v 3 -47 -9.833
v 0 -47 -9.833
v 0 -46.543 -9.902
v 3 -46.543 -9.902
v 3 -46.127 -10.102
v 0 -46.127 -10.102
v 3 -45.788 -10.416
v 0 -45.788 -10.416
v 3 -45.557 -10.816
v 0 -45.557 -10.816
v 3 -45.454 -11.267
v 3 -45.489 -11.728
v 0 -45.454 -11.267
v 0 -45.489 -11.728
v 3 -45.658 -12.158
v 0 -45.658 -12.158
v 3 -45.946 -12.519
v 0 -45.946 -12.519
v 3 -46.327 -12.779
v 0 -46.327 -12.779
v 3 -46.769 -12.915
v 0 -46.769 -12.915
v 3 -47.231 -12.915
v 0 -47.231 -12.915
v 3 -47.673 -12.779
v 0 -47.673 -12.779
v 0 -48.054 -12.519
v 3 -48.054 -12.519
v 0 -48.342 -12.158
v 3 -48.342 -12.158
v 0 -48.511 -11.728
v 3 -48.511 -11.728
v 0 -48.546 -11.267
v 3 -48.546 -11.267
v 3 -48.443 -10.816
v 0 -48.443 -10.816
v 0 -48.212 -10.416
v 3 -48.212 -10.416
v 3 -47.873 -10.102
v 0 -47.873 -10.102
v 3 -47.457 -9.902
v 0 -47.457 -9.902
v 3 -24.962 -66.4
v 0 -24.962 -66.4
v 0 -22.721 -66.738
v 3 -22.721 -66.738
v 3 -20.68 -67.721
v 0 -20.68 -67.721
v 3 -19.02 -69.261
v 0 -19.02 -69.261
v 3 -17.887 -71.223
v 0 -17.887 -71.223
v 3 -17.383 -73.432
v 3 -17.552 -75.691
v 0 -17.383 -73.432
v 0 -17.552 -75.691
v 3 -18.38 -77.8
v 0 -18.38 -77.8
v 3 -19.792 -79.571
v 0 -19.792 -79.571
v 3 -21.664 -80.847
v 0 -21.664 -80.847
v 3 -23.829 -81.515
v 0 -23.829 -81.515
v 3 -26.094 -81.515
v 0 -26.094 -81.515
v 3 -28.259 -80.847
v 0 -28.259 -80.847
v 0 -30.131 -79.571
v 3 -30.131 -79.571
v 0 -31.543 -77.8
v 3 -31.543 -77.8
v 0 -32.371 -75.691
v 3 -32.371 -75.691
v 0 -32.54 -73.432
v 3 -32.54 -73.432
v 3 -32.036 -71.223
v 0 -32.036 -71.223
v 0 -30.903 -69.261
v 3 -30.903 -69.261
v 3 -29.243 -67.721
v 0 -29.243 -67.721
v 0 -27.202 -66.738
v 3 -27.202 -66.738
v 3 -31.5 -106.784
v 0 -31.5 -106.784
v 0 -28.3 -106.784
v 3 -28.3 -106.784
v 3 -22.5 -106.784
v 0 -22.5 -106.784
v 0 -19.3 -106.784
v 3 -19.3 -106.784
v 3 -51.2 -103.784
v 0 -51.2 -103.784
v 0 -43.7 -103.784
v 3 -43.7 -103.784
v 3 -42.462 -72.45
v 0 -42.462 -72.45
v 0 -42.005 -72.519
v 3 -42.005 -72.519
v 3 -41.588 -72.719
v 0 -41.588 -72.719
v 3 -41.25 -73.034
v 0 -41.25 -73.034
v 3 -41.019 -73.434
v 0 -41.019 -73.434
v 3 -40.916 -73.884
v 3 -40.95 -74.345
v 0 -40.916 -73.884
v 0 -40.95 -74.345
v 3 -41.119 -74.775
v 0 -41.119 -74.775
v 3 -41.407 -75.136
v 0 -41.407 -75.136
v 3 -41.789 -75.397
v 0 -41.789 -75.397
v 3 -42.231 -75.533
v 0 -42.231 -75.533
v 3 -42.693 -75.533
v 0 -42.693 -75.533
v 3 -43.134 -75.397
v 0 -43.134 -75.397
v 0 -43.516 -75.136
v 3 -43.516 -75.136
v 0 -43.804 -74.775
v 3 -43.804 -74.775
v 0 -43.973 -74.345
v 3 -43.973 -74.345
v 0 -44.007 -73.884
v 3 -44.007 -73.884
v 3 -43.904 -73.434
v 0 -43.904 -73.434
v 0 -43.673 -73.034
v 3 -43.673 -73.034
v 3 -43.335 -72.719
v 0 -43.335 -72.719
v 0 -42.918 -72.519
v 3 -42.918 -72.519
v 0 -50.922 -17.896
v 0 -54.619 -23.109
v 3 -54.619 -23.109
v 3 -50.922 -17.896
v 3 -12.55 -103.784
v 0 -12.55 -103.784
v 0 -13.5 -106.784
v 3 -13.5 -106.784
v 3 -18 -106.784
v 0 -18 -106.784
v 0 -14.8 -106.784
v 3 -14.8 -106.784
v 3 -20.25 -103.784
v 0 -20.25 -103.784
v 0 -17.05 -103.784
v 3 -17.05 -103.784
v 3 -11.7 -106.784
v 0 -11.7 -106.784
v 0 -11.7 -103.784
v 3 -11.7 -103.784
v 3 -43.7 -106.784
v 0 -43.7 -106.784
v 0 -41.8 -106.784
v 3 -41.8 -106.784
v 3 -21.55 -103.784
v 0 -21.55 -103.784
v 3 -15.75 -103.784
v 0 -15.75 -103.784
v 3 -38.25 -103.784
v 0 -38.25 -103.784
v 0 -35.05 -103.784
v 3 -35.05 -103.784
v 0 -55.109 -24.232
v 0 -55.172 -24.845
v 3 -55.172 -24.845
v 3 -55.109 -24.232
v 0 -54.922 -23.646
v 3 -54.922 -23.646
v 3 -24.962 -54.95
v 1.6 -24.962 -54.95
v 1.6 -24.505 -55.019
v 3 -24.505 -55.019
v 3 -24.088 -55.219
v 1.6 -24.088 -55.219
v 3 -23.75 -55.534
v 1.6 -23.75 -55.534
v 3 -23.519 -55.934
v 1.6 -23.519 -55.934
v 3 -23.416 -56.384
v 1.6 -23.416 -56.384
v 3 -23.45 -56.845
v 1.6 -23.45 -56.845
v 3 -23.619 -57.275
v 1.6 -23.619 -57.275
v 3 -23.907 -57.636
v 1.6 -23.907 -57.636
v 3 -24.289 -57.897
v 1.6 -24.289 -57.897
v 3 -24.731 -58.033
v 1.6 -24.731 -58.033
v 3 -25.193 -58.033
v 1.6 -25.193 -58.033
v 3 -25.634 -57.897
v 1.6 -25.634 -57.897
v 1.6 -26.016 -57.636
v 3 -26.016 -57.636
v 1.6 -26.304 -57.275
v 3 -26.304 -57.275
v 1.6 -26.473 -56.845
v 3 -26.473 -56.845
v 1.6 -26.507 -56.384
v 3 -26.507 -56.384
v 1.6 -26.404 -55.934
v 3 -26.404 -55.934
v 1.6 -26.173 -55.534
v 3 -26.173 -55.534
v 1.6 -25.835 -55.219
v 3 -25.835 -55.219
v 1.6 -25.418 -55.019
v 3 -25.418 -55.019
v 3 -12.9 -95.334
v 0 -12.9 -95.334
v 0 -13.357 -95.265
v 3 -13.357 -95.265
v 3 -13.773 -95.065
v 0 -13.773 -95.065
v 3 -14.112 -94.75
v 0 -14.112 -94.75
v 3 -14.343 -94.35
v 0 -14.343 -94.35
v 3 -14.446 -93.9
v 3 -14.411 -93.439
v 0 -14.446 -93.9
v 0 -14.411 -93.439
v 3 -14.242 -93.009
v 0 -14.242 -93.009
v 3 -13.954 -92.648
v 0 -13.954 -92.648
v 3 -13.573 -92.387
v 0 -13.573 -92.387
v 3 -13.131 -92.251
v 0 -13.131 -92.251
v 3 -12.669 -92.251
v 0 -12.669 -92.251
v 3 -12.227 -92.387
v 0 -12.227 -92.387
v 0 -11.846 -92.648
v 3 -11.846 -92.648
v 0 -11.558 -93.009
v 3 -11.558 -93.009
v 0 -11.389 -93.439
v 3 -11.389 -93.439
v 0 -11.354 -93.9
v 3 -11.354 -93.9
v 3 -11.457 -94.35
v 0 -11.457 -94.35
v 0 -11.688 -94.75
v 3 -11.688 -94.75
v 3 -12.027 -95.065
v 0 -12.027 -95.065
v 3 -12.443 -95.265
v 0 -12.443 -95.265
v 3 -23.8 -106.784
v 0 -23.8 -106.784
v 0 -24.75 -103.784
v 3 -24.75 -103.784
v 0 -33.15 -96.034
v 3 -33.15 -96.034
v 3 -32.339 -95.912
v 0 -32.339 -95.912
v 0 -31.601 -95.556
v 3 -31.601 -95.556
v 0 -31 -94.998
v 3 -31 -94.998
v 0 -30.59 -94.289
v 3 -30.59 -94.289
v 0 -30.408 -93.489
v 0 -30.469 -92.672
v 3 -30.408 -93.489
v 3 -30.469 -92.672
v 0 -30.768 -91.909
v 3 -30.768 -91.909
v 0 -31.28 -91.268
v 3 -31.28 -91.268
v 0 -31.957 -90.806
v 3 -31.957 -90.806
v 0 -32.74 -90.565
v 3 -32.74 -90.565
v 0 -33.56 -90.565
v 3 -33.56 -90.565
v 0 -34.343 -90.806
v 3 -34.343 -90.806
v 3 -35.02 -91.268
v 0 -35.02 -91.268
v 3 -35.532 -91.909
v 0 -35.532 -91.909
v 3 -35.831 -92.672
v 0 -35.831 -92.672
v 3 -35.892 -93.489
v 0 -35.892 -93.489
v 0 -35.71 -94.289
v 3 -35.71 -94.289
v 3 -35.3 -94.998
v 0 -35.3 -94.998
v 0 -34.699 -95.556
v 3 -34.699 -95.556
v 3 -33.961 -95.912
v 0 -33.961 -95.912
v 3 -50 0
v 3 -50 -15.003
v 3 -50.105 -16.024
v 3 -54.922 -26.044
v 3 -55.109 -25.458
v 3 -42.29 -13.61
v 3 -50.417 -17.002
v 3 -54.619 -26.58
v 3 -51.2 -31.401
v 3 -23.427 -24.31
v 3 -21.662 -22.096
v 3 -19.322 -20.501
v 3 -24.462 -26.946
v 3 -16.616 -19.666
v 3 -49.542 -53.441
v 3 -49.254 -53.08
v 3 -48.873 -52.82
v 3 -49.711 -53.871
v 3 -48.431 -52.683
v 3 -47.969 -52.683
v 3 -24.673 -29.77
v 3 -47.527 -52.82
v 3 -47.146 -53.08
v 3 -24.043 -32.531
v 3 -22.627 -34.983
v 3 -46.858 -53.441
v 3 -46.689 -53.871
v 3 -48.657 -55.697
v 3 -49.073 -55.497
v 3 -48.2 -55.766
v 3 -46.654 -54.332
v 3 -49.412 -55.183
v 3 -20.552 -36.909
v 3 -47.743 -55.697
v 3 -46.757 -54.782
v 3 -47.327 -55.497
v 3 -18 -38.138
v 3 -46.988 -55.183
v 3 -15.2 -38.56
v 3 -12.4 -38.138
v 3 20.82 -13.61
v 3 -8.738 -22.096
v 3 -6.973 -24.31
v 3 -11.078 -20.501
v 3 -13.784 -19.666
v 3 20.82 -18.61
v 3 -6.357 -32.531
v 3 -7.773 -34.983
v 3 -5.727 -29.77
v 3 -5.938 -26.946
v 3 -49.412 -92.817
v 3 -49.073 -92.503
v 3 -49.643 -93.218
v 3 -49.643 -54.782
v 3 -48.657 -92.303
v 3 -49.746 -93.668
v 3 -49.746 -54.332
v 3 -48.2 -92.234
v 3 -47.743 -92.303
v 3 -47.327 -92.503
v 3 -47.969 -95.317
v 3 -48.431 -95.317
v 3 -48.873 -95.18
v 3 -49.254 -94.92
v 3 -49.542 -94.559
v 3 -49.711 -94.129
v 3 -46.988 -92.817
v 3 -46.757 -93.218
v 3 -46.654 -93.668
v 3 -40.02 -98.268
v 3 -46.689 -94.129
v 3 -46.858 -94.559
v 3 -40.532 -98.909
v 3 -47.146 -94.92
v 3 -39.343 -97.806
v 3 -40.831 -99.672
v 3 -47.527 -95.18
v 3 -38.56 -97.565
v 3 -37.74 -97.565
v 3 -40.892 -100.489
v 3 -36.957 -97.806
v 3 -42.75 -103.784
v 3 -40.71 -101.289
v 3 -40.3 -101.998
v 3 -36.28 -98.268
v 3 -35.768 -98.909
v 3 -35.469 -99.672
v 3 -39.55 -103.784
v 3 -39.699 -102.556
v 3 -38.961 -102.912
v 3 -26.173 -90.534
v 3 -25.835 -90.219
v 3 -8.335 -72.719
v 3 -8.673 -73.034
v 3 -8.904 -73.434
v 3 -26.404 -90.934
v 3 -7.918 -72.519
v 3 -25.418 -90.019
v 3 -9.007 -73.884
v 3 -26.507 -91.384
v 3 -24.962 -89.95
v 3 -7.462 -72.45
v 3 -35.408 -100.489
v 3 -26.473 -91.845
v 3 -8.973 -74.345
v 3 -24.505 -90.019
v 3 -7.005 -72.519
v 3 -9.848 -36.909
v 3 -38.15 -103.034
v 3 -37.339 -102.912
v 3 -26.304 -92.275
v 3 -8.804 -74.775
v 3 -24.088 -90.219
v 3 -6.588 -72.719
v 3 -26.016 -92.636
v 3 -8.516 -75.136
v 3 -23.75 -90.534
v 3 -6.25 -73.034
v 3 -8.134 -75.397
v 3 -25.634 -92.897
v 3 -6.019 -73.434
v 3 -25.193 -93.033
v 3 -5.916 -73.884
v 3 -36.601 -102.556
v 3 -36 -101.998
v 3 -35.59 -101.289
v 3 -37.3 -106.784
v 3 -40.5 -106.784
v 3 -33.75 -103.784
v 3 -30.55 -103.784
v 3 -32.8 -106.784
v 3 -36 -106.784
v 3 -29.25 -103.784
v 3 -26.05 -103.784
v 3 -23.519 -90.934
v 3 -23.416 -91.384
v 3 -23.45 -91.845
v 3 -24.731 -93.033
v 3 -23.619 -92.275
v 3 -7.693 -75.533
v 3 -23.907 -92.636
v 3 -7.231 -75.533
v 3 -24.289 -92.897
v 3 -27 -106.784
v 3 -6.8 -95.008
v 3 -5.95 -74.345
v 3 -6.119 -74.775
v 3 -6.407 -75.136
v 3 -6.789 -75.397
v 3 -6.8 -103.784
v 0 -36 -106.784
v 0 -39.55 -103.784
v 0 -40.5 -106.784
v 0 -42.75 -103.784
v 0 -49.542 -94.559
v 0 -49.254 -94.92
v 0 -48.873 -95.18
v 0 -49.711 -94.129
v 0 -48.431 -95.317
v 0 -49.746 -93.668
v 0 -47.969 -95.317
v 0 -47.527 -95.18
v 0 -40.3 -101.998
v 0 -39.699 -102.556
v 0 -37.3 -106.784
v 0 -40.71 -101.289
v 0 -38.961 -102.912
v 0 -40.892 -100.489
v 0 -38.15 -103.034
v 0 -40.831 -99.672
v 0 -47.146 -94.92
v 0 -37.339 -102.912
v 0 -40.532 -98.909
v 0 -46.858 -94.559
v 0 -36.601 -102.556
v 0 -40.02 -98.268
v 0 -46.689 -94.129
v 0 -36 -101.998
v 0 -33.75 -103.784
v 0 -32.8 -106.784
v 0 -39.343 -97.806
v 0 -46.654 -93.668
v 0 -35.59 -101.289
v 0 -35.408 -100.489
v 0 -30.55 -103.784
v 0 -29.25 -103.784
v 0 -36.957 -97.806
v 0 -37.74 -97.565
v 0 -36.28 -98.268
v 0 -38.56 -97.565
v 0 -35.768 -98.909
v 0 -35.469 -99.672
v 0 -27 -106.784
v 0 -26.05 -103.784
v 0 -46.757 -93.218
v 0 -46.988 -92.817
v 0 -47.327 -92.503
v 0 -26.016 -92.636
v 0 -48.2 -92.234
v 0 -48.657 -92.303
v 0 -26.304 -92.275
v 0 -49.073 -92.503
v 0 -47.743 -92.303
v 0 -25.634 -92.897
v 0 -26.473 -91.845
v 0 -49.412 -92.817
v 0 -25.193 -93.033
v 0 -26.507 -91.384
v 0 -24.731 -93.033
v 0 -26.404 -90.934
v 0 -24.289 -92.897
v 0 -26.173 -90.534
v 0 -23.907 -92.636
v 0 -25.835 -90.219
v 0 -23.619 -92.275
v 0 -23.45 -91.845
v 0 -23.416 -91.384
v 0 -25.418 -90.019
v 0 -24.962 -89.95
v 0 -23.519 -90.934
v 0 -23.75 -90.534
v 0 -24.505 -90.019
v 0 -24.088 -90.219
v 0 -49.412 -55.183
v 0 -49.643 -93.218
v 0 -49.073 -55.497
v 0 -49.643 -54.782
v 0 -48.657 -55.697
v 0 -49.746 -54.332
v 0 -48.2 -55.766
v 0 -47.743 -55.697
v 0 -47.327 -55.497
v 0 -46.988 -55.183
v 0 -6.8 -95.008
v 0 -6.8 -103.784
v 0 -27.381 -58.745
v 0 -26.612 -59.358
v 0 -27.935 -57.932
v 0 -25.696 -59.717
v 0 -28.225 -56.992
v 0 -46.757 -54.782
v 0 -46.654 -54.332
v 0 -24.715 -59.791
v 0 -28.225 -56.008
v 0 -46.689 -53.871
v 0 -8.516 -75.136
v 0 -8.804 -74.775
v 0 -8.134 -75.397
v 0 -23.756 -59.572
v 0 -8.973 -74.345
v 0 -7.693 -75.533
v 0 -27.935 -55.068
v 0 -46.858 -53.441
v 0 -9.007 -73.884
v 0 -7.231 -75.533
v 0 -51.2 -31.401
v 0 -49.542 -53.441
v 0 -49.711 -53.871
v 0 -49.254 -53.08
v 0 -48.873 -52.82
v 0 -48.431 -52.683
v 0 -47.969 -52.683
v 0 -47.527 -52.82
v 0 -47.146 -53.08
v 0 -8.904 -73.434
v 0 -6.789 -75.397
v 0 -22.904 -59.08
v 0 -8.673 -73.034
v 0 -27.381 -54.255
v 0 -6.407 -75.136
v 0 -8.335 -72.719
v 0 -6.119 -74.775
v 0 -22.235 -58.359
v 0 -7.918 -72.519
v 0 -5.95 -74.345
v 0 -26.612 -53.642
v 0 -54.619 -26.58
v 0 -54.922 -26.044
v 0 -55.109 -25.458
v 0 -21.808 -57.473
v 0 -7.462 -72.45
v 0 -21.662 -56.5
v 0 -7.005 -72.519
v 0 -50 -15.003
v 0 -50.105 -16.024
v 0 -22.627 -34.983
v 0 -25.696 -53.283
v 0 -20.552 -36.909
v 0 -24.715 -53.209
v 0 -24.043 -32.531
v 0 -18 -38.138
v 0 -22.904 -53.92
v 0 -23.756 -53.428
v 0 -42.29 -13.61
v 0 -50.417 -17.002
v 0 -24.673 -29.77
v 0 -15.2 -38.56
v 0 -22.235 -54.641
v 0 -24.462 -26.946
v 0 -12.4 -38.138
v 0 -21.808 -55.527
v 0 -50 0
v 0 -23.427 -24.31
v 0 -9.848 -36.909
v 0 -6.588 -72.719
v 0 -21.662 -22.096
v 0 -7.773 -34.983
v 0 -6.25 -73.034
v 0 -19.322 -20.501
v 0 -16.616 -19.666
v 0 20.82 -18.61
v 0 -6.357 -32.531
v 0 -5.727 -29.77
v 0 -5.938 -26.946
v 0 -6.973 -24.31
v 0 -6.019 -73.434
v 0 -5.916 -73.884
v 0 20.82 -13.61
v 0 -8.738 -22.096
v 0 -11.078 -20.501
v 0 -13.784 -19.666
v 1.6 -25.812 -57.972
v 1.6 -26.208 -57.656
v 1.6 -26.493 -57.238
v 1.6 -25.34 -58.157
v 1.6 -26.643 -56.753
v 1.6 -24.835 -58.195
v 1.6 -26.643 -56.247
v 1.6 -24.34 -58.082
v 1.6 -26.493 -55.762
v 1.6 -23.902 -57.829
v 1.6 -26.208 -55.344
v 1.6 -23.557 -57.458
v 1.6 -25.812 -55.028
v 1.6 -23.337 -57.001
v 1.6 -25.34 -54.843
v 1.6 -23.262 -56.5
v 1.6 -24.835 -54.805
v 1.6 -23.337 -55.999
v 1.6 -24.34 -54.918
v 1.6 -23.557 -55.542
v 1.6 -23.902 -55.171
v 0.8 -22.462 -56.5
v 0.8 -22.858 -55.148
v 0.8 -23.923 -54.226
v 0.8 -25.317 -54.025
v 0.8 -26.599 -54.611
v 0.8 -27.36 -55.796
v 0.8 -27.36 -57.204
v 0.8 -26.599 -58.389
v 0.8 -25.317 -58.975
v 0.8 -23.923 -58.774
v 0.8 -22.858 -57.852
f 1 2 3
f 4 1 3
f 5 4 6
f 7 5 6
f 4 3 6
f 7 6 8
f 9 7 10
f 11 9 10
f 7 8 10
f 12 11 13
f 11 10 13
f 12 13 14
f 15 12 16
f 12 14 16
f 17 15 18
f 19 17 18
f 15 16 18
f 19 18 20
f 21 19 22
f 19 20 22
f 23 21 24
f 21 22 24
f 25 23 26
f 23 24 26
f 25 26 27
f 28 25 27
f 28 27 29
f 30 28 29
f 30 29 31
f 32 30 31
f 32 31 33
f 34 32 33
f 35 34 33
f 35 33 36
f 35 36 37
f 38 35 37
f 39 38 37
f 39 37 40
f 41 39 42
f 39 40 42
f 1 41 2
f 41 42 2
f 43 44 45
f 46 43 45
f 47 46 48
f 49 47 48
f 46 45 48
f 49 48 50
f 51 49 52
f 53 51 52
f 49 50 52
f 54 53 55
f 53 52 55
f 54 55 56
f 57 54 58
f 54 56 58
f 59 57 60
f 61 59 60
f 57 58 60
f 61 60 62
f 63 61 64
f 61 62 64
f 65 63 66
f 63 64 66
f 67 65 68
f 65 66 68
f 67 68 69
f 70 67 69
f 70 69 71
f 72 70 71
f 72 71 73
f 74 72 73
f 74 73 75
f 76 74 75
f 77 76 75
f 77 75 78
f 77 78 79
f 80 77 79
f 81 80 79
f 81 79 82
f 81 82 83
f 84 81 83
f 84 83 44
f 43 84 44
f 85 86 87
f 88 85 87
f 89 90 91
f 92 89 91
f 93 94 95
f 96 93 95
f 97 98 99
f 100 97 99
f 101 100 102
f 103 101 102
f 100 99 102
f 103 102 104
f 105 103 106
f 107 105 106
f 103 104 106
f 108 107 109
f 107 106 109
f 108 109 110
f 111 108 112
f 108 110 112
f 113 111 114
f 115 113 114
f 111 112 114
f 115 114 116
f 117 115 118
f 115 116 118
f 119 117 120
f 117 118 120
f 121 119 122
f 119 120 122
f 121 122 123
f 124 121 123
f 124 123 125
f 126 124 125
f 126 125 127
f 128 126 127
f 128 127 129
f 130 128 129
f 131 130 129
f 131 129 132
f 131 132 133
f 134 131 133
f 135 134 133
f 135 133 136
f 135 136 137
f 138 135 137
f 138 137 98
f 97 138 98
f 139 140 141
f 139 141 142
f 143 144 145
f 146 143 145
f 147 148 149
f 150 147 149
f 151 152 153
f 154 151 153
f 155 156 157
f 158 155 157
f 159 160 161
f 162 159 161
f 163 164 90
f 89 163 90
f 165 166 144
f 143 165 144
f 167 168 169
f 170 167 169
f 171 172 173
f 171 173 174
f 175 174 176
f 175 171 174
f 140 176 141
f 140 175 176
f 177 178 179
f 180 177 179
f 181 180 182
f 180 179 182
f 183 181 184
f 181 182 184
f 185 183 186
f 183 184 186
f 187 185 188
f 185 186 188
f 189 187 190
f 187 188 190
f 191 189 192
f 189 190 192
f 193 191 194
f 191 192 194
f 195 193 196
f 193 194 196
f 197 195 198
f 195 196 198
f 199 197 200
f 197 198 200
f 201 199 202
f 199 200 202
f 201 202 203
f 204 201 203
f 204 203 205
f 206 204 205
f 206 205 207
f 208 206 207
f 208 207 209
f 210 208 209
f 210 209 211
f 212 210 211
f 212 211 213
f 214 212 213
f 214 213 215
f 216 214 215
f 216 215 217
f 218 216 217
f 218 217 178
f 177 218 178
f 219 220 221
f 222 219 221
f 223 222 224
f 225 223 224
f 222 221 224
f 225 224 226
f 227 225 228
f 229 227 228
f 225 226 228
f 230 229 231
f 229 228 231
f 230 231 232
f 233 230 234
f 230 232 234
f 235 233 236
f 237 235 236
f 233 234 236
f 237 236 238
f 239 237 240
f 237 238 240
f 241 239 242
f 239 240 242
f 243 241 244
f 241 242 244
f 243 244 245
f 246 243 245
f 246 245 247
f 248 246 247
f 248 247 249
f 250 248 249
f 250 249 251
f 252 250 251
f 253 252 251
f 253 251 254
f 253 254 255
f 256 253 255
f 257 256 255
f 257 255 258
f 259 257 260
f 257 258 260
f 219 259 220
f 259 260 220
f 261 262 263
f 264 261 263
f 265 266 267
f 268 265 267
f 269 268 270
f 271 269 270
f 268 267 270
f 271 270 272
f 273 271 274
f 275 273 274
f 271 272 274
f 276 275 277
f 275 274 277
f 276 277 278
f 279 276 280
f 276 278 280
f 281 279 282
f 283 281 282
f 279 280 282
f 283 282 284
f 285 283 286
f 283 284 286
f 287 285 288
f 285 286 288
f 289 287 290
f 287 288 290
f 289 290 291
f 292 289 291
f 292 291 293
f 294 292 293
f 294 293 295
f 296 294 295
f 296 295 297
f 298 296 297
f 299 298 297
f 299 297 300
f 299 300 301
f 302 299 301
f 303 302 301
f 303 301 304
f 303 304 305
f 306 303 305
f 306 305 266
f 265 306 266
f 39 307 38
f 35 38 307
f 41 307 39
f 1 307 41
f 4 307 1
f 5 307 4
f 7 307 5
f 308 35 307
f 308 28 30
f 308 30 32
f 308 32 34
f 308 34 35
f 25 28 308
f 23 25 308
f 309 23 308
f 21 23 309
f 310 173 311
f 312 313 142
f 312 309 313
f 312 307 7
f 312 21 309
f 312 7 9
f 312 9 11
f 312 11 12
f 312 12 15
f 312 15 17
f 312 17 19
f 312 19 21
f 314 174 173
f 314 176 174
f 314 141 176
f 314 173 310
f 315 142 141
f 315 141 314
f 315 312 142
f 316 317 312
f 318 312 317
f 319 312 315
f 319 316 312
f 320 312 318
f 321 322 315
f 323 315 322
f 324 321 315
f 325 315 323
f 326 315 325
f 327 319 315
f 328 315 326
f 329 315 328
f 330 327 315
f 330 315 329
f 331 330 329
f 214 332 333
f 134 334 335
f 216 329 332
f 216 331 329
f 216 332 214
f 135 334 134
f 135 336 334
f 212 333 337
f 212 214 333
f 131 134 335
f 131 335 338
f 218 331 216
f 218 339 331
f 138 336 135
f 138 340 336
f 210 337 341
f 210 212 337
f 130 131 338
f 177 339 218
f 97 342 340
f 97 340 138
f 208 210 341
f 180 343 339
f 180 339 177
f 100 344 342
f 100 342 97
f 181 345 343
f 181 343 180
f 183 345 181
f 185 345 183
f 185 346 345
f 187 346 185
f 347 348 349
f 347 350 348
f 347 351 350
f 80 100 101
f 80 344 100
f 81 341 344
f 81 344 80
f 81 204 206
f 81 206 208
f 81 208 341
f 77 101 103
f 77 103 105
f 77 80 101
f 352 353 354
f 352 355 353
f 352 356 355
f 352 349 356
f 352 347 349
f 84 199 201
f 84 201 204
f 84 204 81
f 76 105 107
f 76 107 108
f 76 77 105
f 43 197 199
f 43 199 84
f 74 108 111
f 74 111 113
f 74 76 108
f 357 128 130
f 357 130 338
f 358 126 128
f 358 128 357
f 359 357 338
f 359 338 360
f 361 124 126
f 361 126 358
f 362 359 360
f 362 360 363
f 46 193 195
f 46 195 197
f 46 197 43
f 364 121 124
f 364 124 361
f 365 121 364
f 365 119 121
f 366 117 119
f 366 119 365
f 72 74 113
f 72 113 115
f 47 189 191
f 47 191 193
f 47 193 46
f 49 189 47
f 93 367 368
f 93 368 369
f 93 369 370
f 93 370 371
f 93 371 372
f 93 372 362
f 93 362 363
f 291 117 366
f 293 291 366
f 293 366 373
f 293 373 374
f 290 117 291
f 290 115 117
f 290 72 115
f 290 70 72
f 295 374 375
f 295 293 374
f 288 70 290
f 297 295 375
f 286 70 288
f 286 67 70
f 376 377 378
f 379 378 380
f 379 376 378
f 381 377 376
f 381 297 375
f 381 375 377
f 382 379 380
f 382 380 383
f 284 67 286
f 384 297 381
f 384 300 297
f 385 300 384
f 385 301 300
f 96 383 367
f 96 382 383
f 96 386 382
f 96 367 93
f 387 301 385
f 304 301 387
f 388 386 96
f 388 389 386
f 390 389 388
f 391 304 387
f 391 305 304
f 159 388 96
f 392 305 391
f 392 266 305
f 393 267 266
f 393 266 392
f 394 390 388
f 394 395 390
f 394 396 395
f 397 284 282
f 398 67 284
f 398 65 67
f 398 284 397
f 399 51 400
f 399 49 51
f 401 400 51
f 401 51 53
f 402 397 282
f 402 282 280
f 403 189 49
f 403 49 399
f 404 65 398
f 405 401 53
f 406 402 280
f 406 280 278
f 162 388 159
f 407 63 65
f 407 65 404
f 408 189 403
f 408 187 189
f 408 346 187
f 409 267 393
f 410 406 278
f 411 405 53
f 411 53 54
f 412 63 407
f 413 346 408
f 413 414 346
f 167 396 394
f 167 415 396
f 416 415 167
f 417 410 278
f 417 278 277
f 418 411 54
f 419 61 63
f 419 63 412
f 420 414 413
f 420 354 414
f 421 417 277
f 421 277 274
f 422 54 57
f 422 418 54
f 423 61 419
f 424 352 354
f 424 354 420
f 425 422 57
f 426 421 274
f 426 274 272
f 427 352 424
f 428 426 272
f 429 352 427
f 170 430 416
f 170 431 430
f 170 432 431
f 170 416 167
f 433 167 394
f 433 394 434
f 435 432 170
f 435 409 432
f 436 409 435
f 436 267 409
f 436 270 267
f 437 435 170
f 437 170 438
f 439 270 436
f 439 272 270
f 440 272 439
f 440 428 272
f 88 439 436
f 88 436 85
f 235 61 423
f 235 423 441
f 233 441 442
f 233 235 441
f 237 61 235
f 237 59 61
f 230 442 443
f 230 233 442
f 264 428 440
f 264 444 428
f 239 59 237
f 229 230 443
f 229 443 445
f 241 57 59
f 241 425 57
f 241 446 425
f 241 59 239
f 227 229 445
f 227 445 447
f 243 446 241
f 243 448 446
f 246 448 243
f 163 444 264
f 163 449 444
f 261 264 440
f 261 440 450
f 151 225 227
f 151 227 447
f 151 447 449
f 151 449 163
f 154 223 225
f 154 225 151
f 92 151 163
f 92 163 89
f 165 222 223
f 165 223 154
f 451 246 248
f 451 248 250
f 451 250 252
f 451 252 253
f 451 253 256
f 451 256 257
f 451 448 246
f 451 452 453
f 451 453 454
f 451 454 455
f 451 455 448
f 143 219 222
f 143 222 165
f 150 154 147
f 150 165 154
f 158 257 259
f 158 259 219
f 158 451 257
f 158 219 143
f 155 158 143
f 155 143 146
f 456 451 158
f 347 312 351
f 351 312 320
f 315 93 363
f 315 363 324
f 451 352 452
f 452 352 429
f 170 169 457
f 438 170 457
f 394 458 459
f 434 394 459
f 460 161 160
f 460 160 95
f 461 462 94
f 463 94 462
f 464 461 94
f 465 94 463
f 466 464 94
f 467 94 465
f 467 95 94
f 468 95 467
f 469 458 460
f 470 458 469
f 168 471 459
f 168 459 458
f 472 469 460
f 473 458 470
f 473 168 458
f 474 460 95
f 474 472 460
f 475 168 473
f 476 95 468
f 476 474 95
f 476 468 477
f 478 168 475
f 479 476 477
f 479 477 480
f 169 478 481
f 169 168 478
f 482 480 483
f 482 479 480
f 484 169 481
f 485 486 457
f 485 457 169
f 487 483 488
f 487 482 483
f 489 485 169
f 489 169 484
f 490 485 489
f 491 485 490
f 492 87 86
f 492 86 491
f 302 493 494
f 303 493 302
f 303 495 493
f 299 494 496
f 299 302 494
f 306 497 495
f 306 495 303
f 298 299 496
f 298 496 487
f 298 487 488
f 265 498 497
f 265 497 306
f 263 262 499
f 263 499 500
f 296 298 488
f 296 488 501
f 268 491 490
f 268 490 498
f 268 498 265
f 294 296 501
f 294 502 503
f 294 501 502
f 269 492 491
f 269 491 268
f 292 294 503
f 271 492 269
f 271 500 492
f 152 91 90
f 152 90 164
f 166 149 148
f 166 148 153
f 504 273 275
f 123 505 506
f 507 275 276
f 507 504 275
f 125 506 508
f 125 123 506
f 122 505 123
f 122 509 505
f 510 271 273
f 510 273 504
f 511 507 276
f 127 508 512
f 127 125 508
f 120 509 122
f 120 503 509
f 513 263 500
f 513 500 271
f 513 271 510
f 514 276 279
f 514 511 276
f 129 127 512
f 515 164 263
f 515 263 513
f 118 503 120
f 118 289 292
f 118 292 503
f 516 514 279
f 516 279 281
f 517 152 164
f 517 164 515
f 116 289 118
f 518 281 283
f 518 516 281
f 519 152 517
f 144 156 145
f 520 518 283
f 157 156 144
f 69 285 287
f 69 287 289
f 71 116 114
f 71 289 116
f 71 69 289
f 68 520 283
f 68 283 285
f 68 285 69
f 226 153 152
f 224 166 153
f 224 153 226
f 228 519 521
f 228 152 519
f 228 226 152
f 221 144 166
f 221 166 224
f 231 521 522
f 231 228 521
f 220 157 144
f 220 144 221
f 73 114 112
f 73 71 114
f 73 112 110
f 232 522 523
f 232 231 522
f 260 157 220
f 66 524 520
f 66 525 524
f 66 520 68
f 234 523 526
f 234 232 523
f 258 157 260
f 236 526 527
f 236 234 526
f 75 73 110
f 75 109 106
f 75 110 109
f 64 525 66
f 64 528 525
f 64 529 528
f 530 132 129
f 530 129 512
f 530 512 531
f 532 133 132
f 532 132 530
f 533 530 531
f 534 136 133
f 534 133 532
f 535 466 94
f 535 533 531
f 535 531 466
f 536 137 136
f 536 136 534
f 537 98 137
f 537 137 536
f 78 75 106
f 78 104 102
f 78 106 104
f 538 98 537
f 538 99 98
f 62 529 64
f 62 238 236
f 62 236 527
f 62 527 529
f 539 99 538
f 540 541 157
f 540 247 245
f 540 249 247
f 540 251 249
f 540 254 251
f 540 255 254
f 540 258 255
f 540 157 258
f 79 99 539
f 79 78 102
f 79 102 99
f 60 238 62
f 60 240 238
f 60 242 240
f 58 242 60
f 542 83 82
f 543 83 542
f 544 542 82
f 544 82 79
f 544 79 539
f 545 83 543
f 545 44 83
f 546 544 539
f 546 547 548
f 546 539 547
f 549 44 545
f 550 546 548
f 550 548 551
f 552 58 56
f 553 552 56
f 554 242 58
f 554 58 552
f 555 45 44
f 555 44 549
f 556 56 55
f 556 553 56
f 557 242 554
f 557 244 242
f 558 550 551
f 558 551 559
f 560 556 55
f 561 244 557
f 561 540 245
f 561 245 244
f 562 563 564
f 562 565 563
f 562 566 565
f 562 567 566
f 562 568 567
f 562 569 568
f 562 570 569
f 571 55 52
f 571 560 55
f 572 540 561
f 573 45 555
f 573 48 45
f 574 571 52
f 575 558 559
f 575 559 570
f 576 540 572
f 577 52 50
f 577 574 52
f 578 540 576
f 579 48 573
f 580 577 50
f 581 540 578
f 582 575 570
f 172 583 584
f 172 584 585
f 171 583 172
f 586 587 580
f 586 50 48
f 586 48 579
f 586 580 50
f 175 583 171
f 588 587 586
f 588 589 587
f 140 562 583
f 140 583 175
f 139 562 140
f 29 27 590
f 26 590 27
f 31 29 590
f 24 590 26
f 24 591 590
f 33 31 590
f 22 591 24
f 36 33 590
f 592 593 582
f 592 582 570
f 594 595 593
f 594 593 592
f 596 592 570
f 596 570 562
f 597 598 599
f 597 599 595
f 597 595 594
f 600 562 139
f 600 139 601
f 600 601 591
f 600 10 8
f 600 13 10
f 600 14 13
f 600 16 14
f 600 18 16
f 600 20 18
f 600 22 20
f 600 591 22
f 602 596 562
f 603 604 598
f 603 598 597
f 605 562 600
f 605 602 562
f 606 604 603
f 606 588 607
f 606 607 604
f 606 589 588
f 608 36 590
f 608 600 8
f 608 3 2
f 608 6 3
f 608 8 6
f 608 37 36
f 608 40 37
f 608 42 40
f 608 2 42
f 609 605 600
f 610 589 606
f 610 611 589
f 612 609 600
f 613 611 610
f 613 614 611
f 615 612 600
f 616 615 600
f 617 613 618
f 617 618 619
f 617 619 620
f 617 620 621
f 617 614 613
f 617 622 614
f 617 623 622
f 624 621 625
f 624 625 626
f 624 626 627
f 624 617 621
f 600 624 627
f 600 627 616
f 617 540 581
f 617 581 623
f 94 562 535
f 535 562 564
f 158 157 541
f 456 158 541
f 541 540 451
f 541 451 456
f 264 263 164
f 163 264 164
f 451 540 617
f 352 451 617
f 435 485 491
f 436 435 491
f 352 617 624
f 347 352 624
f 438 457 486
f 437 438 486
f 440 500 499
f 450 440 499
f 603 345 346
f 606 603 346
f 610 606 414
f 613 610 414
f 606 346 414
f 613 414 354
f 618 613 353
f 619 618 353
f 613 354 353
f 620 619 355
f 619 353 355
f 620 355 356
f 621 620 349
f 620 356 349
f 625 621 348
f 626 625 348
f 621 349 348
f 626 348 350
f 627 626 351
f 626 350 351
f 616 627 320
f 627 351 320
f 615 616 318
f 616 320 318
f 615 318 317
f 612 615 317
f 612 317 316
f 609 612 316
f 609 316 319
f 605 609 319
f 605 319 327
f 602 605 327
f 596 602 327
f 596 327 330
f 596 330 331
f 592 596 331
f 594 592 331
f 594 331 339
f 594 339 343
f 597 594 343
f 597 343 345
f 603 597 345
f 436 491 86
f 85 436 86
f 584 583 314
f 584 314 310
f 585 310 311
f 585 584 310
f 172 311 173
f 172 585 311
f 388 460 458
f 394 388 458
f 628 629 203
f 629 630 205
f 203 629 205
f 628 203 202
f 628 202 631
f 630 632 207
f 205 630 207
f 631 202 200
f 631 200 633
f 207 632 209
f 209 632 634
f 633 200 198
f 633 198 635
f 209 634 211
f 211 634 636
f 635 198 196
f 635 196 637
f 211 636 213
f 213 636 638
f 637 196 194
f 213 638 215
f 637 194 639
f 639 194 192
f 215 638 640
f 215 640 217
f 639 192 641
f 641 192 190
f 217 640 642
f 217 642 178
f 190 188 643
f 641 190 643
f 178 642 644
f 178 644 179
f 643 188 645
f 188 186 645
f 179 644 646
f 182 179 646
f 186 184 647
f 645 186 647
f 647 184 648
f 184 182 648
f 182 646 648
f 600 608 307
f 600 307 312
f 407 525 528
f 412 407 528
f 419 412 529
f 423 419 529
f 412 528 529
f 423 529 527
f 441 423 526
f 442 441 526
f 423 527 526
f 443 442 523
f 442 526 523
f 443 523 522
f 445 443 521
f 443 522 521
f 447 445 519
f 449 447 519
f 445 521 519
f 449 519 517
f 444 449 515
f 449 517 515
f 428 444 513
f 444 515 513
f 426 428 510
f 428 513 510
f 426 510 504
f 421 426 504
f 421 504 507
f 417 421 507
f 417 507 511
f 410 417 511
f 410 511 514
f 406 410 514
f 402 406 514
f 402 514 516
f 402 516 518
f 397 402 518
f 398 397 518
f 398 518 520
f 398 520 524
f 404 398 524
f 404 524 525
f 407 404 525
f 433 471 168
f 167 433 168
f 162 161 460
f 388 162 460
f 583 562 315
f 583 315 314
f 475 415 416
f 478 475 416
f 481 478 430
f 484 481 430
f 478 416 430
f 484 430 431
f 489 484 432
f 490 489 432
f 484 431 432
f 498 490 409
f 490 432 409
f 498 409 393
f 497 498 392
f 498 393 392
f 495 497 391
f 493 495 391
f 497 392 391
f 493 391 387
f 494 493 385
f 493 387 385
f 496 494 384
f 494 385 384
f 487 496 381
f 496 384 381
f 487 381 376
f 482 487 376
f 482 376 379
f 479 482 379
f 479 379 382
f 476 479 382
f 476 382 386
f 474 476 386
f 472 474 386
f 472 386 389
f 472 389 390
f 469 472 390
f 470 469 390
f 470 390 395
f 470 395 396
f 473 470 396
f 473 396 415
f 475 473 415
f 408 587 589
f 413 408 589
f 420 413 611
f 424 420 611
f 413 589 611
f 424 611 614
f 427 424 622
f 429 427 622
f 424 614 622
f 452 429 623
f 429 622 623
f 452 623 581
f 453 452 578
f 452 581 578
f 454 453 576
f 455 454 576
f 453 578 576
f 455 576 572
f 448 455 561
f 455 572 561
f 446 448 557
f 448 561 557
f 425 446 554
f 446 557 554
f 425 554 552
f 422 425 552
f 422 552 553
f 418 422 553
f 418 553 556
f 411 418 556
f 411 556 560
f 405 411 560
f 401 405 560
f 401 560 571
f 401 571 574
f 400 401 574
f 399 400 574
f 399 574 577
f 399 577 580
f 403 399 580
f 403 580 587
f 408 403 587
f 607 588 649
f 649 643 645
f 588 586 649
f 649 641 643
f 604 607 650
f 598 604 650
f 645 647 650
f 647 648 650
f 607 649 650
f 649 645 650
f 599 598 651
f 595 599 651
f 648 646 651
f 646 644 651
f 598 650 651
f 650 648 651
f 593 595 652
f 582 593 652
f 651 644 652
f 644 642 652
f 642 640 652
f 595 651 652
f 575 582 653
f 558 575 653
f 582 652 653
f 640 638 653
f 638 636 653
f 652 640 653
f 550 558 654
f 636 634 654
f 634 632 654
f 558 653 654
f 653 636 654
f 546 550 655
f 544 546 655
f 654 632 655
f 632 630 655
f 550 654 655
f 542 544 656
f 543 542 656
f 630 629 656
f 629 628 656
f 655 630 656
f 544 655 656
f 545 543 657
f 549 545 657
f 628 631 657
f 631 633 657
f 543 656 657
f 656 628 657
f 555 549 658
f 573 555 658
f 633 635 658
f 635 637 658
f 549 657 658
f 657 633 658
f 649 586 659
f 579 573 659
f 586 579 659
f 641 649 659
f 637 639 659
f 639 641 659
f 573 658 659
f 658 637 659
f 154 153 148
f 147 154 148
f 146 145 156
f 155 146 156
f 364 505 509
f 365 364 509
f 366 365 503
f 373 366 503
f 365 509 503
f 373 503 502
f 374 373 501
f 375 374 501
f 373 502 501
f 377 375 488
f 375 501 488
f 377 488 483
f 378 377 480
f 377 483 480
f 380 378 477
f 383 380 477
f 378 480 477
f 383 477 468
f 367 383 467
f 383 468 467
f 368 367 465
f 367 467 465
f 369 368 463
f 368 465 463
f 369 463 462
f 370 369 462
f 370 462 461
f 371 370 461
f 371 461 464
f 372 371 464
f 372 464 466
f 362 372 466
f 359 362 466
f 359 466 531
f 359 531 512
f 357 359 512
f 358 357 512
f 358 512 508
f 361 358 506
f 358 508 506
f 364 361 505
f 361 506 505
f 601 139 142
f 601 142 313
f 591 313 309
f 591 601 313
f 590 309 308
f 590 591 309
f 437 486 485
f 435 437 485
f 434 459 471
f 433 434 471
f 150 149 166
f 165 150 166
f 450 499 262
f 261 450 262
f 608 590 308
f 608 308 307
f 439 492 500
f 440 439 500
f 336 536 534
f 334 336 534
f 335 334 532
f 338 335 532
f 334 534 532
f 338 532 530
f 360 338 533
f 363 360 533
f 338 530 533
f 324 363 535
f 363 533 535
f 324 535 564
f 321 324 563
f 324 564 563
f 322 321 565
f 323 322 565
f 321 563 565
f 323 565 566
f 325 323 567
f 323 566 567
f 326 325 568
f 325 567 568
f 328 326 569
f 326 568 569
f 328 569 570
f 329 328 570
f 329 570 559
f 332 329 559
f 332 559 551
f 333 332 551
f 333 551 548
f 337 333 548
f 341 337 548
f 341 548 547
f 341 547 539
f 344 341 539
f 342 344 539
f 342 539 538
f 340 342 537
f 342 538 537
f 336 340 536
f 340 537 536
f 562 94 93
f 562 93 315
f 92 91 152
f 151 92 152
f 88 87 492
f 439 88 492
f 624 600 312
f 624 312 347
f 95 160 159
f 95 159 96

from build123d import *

# Parameters (mm, degrees)
EXTRUDE_1_DEPTH         = 3
SKETCH_3_R              = 7.6
SKETCH_3_R_2            = 9.5
SKETCH_3_R_3            = 1.55
CUT_EXTRUDE_1_DEPTH     = 112.843640856
EXTRUDE_6_DEPTH         = 3
SKETCH_10_R             = 1.55
CUT_EXTRUDE_3_DEPTH     = 124.991771172
CUT_EXTRUDE_6_DEPTH     = 124.991771172
EXTRUDE_7_DEPTH         = 3
CUT_EXTRUDE_7_DEPTH     = 124.991771172
SKETCH_18_W             = 9.7
SKETCH_18_H             = 35
CUT_EXTRUDE_9_DEPTH     = 124.991771172
SKETCH_19_R             = 1.55
CUT_EXTRUDE_10_DEPTH    = 124.991771172
SKETCH_20_W             = 61.573881036
SKETCH_20_H             = 3.2
SKETCH_20_W_2           = 79.598608315
SKETCH_20_H_2           = 1.2
EXTRUDE_8_DEPTH         = 3
EXTRUDE_START           = -3
EXTRUDE_9_DEPTH         = 3
EXTRUDE_11_DEPTH        = 3
SKETCH_25_R             = 9.5
EXTRUDE_12_DEPTH        = 3
SKETCH_26_R             = 9.5
CUT_EXTRUDE_11_DEPTH    = 124.991771172
EXTRUDE_13_DEPTH        = 3
CUT_EXTRUDE_12_DEPTH    = 3
SKETCH_29_W             = 5.5
SKETCH_29_H             = 32
EXTRUDE_14_DEPTH        = 3
SKETCH_32_W             = 9.716106013
SKETCH_32_H             = 6
CUT_EXTRUDE_13_DEPTH    = 124.991771172
CUT_EXTRUDE_16_DEPTH    = 3
SKETCH_35_W             = 2.5
SKETCH_35_H             = 44.4
EXTRUDE_15_DEPTH        = 3
SKETCH_36_R             = 1.55
CUT_EXTRUDE_14794_DEPTH = 3
EXTRUDE_16_DEPTH        = 3
SKETCH_38_R             = 2.75
CUT_EXTRUDE_L_DEPTH     = 121.232106085
SKETCH_41_R             = 1.55
EXTRUDE_17_DEPTH        = 3
CUT_EXTRUDE_17_DEPTH    = 121.232106085


# Read off the part's stored shape, not the designer's step: 高级异型孔1
with BuildPart() as part:
    # 草图1 → 凸台-拉伸1 (new body)
    with BuildSketch(Plane(origin=(0, 0, 0), x_dir=(0, 0, -1), z_dir=(1, 0, 0))):
        Polygon((0, -50), (18.610302832, -39.45792997), (18.610302832, 40), (58.496702951, 40), (58.496702951, 0), (100, 0), (100, -50), align=None)
    extrude(amount=EXTRUDE_1_DEPTH)

    # 草图3 → 切除-拉伸1 (cut, through all)
    with BuildSketch(Plane.ZY):
        with Locations((-74, -24.961577338)):
            Circle(SKETCH_3_R)
        with Locations((-34.176393222, 0)):
            Circle(SKETCH_3_R_2)
        with Locations((-74, -7.461577338)):
            Circle(SKETCH_3_R_3)
        with Locations((-56.5, -24.961577338)):
            Circle(SKETCH_3_R_3)
        with Locations((-74, -42.461577338)):
            Circle(SKETCH_3_R_3)
        with Locations((-91.5, -24.961577338)):
            Circle(SKETCH_3_R_3)
    extrude(amount=-CUT_EXTRUDE_1_DEPTH, mode=Mode.SUBTRACT)

    # 草图6 → 凸台-拉伸6 (add)
    with BuildSketch(Plane.ZY):
        with BuildLine():
            Line((-102.983893987, -45.2), (-110.983893987, -45.2))
            Line((-110.983893987, -45.2), (-111, -50))
            Line((-111, -50), (-100, -50))
            Line((-100, -50), (-100, 0))
            Line((-100, 0), (-110.983893987, 0))
            Line((-110.983893987, 0), (-110.983893987, -6.8))
            Line((-110.983893987, -6.8), (-102.983893987, -6.8))
            ThreePointArc((-102.983893987, -6.8), (-101.283893987, -8.5), (-102.983893987, -10.2))
            Line((-102.983893987, -10.2), (-110.983893987, -10.2))
            Line((-110.983893987, -10.2), (-110.983893987, -41.8))
            Line((-110.983893987, -41.8), (-102.983893987, -41.8))
            ThreePointArc((-102.983893987, -41.8), (-101.283893987, -43.5), (-102.983893987, -45.2))
        make_face()
        with BuildLine():
            Line((-15.00347976, -50), (-34.686448159, -50))
            ThreePointArc((-34.686448159, -50), (-33.16855591, -50.235967767), (-31.793933119, -50.921598751))
            Line((-31.793933119, -50.921598751), (-26.580472983, -54.619128968))
            ThreePointArc((-26.580472983, -54.619128968), (-25.755699309, -55.030507559), (-24.844963959, -55.172088219))
            ThreePointArc((-24.844963959, -55.172088219), (-23.93422861, -55.030507559), (-23.109454935, -54.619128968))
            Line((-23.109454935, -54.619128968), (-17.8959948, -50.921598751))
            ThreePointArc((-17.8959948, -50.921598751), (-16.521372009, -50.235967767), (-15.00347976, -50))
        make_face()
    extrude(amount=-EXTRUDE_6_DEPTH)

    # 草图10 → 切除-拉伸3 (cut, through all)
    with BuildSketch(Plane.ZY):
        with Locations((-105.983893987, -15.2)):
            Circle(SKETCH_10_R)
        with Locations((-105.983893987, -36.8)):
            Circle(SKETCH_10_R)
    extrude(amount=-CUT_EXTRUDE_3_DEPTH, mode=Mode.SUBTRACT)

    # 草图14 → 切除-拉伸6 (cut, through all)
    with BuildSketch(Plane(origin=(3, 0, 0), x_dir=(0, 0, -1), z_dir=(1, 0, 0))):
        with BuildLine():
            Line((58.496702951, 0), (58.496702951, 40))
            Line((58.496702951, 40), (18.610302832, 40))
            Line((18.610302832, 40), (18.610302832, 18.686206016))
            ThreePointArc((18.610302832, 18.686206016), (44.493983197, 22.023278649), (58.496702951, 0))
        make_face()
    extrude(amount=-CUT_EXTRUDE_6_DEPTH, mode=Mode.SUBTRACT)

    # 草图15 → 凸台-拉伸7 (add)
    with BuildSketch(Plane(origin=(3, 0, 0), x_dir=(0, 0, -1), z_dir=(1, 0, 0))):
        with BuildLine():
            Line((18.610302832, 18.686206016), (18.610302832, -18.686206016))
            ThreePointArc((18.610302832, -18.686206016), (9.856083494, 0), (18.610302832, 18.686206016))
        make_face()
    extrude(amount=-EXTRUDE_7_DEPTH)

    # 草图16 → 切除-拉伸7 (cut, through all)
    with BuildSketch(Plane(origin=(3, 0, 0), x_dir=(0, 0, -1), z_dir=(1, 0, 0))):
        with BuildLine():
            Line((18.610302832, -18.686206016), (18.610302832, 0))
            ThreePointArc((18.610302832, 0), (34.176393222, 15.56609039), (49.742483613, 0))
            Line((49.742483613, 0), (58.496702951, 0))
            ThreePointArc((58.496702951, 0), (23.858803248, 22.023278649), (18.610302832, -18.686206016))
        make_face()
    extrude(amount=-CUT_EXTRUDE_7_DEPTH, mode=Mode.SUBTRACT)

    # 草图18 → 切除-拉伸9 (cut, through all)
    with BuildSketch(Plane.ZY):
        with Locations((-106.133893987, -26)):
            Rectangle(SKETCH_18_W, SKETCH_18_H)
    extrude(amount=-CUT_EXTRUDE_9_DEPTH, mode=Mode.SUBTRACT)

    # 草图19 → 切除-拉伸10 (cut, through all)
    with BuildSketch(Plane.ZY):
        with Locations((-105.983893987, -1.8)):
            Circle(SKETCH_19_R)
        with Locations((-105.993932098, -48.2)):
            Circle(SKETCH_19_R)
    extrude(amount=-CUT_EXTRUDE_10_DEPTH, mode=Mode.SUBTRACT)

    # 草图20 → 凸台-拉伸8 (add)
    with BuildSketch(Plane.ZY):
        with Locations((-80.196953469, 1.6)):
            Rectangle(SKETCH_20_W, SKETCH_20_H)
        with Locations((-71.200695842, -50.6)):
            Rectangle(SKETCH_20_W_2, SKETCH_20_H_2)
    extrude(amount=-EXTRUDE_8_DEPTH)

    # 草图22 → 凸台-拉伸9 (add)
    with BuildSketch(Plane.ZY.offset(EXTRUDE_START)):
        with BuildLine():
            Line((-18.610302832, 0), (-18.610302832, 25))
            Line((-18.610302832, 25), (-41.044918155, 13.968769999))
            ThreePointArc((-41.044918155, 13.968769999), (-25.948784515, 13.213993529), (-18.610302832, 0))
        make_face()
    extrude(amount=EXTRUDE_9_DEPTH)

    # 草图24 → 凸台-拉伸11 (add)
    with BuildSketch(Plane.ZY):
        Polygon((-18.610302832, 25), (-70.983893987, 3.2), (-49.410012951, 3.2), align=None)
    extrude(amount=-EXTRUDE_11_DEPTH)

    # 草图25 → 凸台-拉伸12 (add, through all)
    with BuildSketch(Plane(origin=(3, 0, 0), x_dir=(0, 0, -1), z_dir=(1, 0, 0))):
        with Locations((34.176393222, 0)):
            Circle(SKETCH_25_R)
    extrude(amount=-EXTRUDE_12_DEPTH)

    # 草图26 → 切除-拉伸11 (cut, through all)
    with BuildSketch(Plane(origin=(3, 0, 0), x_dir=(0, 0, -1), z_dir=(1, 0, 0))):
        with Locations((29.059828781, -15.2)):
            Circle(SKETCH_26_R)
    extrude(amount=-CUT_EXTRUDE_11_DEPTH, mode=Mode.SUBTRACT)

    # 草图27 → 凸台-拉伸13 (add)
    with BuildSketch(Plane.ZY):
        Polygon((-18.610302832, -10.2), (-13.610302832, -15.2), (-18.610302832, -20.2), align=None)
    extrude(amount=-EXTRUDE_13_DEPTH)

    # 草图28 → 切除-拉伸12 (cut)
    with BuildSketch(Plane.ZY):
        Polygon((-110.983893987, 3.2), (-101.283893987, 3.2), (-70.983893987, 3.2), (-95.008477086, -6.8), (-101.283893987, -6.8), (-101.283893987, -45.2), (-110.983893987, -45.2), align=None)
    extrude(amount=-CUT_EXTRUDE_12_DEPTH, mode=Mode.SUBTRACT)

    # 草图29 → 凸台-拉伸14 (add)
    with BuildSketch(Plane.ZY):
        with Locations((-104.033893987, -27.7)):
            Rectangle(SKETCH_29_W, SKETCH_29_H)
    extrude(amount=-EXTRUDE_14_DEPTH)

    # 草图32 → 切除-拉伸13 (cut, through all)
    with BuildSketch(Plane.ZY):
        with Locations((-106.141946993, -48.2)):
            Rectangle(SKETCH_32_W, SKETCH_32_H)
    extrude(amount=-CUT_EXTRUDE_13_DEPTH, mode=Mode.SUBTRACT)

    # 草图34 → 切除-拉伸16 (cut)
    with BuildSketch(Plane.ZY):
        Polygon((-103.783893987, -15.75), (-103.783893987, -12.55), (-106.783893987, -13.5), (-106.783893987, -14.8), align=None)
        Polygon((-106.783893987, -18), (-106.783893987, -19.3), (-103.783893987, -20.25), (-103.783893987, -17.05), align=None)
        Polygon((-106.783893987, -22.5), (-106.783893987, -23.8), (-103.783893987, -24.75), (-103.783893987, -21.55), align=None)
        Polygon((-106.783893987, -27), (-106.783893987, -28.3), (-103.783893987, -29.25), (-103.783893987, -26.05), align=None)
        Polygon((-106.783893987, -31.5), (-106.783893987, -32.8), (-103.783893987, -33.75), (-103.783893987, -30.55), align=None)
        Polygon((-106.783893987, -36), (-106.783893987, -37.3), (-103.783893987, -38.25), (-103.783893987, -35.05), align=None)
        Polygon((-106.783893987, -40.5), (-106.783893987, -41.8), (-103.783893987, -42.75), (-103.783893987, -39.55), align=None)
    extrude(amount=-CUT_EXTRUDE_16_DEPTH, mode=Mode.SUBTRACT)

    # 草图35 → 凸台-拉伸15 (add, through all)
    with BuildSketch(Plane.ZY):
        with Locations((-102.533893987, -29)):
            Rectangle(SKETCH_35_W, SKETCH_35_H)
    extrude(amount=-EXTRUDE_15_DEPTH)

    # 草图36 → Cut-Extrude 14794 (cut)
    with BuildSketch(Plane.ZY):
        with Locations((-93.783893987, -48.2)):
            Circle(SKETCH_36_R)
        with Locations(Location((-93.783893987, -12.9, 0), (0, 0, 180))):
            Circle(SKETCH_36_R)
        with Locations((-21.610302832, 20.501770791)):
            Circle(SKETCH_36_R)
        with Locations((-11.382694019, -47)):
            Circle(SKETCH_36_R)
        with Locations(Location((-54.216106013, -48.2, 0), (0, 0, 180))):
            Circle(SKETCH_36_R)
    extrude(amount=-CUT_EXTRUDE_14794_DEPTH, mode=Mode.SUBTRACT)

    # 草图37 → 凸台-拉伸16 (add)
    with BuildSketch(Plane.ZY):
        Polygon((-13.610302832, -39.45792997), (-13.610302832, -42.290250896), (-18.610302832, -39.45792997), (-18.610302832, 25), (-13.610302832, 25), align=None)
    extrude(amount=-EXTRUDE_16_DEPTH)

    # 草图38 → L型支架定位孔 (cut, through all)
    with BuildSketch(Plane(origin=(3, 0, 0), x_dir=(0, 0, -1), z_dir=(1, 0, 0))):
        with Locations((100.283893987, -38.15)):
            Circle(SKETCH_38_R)
        with Locations((93.283893987, -33.15)):
            Circle(SKETCH_38_R)
    extrude(amount=-CUT_EXTRUDE_L_DEPTH, mode=Mode.SUBTRACT)

    # 高级异型孔1 outline → 高级异型孔1 (revolve, cut)
    with BuildSketch(Plane(origin=(0, -24.961577338, -56.5), x_dir=(0, 1, 0), z_dir=(0, 0, -1))):
        Polygon((1.7, 1.6), (1.55, 1.6), (1.55, 0), (3.3, 0), align=None)
    revolve(axis=Axis((0, -24.961577338, -56.5), (1, 0, 0)), mode=Mode.SUBTRACT)

    # 草图41 → 凸台-拉伸17 (add, through all)
    with BuildSketch(Plane.ZY):
        with Locations((-21.610302832, 20.501770791)):
            Circle(SKETCH_41_R)
    extrude(amount=-EXTRUDE_17_DEPTH)

    # 草图42 → 切除-拉伸17 (cut, through all)
    with BuildSketch(Plane.ZY):
        Polygon((-95.008477086, -6.8), (-18.610302832, 20.82), (-13.610302832, 20.82), (-13.610302832, 25), (-18.610302832, 25), align=None)
    extrude(amount=-CUT_EXTRUDE_17_DEPTH, mode=Mode.SUBTRACT)


solid = part.part
